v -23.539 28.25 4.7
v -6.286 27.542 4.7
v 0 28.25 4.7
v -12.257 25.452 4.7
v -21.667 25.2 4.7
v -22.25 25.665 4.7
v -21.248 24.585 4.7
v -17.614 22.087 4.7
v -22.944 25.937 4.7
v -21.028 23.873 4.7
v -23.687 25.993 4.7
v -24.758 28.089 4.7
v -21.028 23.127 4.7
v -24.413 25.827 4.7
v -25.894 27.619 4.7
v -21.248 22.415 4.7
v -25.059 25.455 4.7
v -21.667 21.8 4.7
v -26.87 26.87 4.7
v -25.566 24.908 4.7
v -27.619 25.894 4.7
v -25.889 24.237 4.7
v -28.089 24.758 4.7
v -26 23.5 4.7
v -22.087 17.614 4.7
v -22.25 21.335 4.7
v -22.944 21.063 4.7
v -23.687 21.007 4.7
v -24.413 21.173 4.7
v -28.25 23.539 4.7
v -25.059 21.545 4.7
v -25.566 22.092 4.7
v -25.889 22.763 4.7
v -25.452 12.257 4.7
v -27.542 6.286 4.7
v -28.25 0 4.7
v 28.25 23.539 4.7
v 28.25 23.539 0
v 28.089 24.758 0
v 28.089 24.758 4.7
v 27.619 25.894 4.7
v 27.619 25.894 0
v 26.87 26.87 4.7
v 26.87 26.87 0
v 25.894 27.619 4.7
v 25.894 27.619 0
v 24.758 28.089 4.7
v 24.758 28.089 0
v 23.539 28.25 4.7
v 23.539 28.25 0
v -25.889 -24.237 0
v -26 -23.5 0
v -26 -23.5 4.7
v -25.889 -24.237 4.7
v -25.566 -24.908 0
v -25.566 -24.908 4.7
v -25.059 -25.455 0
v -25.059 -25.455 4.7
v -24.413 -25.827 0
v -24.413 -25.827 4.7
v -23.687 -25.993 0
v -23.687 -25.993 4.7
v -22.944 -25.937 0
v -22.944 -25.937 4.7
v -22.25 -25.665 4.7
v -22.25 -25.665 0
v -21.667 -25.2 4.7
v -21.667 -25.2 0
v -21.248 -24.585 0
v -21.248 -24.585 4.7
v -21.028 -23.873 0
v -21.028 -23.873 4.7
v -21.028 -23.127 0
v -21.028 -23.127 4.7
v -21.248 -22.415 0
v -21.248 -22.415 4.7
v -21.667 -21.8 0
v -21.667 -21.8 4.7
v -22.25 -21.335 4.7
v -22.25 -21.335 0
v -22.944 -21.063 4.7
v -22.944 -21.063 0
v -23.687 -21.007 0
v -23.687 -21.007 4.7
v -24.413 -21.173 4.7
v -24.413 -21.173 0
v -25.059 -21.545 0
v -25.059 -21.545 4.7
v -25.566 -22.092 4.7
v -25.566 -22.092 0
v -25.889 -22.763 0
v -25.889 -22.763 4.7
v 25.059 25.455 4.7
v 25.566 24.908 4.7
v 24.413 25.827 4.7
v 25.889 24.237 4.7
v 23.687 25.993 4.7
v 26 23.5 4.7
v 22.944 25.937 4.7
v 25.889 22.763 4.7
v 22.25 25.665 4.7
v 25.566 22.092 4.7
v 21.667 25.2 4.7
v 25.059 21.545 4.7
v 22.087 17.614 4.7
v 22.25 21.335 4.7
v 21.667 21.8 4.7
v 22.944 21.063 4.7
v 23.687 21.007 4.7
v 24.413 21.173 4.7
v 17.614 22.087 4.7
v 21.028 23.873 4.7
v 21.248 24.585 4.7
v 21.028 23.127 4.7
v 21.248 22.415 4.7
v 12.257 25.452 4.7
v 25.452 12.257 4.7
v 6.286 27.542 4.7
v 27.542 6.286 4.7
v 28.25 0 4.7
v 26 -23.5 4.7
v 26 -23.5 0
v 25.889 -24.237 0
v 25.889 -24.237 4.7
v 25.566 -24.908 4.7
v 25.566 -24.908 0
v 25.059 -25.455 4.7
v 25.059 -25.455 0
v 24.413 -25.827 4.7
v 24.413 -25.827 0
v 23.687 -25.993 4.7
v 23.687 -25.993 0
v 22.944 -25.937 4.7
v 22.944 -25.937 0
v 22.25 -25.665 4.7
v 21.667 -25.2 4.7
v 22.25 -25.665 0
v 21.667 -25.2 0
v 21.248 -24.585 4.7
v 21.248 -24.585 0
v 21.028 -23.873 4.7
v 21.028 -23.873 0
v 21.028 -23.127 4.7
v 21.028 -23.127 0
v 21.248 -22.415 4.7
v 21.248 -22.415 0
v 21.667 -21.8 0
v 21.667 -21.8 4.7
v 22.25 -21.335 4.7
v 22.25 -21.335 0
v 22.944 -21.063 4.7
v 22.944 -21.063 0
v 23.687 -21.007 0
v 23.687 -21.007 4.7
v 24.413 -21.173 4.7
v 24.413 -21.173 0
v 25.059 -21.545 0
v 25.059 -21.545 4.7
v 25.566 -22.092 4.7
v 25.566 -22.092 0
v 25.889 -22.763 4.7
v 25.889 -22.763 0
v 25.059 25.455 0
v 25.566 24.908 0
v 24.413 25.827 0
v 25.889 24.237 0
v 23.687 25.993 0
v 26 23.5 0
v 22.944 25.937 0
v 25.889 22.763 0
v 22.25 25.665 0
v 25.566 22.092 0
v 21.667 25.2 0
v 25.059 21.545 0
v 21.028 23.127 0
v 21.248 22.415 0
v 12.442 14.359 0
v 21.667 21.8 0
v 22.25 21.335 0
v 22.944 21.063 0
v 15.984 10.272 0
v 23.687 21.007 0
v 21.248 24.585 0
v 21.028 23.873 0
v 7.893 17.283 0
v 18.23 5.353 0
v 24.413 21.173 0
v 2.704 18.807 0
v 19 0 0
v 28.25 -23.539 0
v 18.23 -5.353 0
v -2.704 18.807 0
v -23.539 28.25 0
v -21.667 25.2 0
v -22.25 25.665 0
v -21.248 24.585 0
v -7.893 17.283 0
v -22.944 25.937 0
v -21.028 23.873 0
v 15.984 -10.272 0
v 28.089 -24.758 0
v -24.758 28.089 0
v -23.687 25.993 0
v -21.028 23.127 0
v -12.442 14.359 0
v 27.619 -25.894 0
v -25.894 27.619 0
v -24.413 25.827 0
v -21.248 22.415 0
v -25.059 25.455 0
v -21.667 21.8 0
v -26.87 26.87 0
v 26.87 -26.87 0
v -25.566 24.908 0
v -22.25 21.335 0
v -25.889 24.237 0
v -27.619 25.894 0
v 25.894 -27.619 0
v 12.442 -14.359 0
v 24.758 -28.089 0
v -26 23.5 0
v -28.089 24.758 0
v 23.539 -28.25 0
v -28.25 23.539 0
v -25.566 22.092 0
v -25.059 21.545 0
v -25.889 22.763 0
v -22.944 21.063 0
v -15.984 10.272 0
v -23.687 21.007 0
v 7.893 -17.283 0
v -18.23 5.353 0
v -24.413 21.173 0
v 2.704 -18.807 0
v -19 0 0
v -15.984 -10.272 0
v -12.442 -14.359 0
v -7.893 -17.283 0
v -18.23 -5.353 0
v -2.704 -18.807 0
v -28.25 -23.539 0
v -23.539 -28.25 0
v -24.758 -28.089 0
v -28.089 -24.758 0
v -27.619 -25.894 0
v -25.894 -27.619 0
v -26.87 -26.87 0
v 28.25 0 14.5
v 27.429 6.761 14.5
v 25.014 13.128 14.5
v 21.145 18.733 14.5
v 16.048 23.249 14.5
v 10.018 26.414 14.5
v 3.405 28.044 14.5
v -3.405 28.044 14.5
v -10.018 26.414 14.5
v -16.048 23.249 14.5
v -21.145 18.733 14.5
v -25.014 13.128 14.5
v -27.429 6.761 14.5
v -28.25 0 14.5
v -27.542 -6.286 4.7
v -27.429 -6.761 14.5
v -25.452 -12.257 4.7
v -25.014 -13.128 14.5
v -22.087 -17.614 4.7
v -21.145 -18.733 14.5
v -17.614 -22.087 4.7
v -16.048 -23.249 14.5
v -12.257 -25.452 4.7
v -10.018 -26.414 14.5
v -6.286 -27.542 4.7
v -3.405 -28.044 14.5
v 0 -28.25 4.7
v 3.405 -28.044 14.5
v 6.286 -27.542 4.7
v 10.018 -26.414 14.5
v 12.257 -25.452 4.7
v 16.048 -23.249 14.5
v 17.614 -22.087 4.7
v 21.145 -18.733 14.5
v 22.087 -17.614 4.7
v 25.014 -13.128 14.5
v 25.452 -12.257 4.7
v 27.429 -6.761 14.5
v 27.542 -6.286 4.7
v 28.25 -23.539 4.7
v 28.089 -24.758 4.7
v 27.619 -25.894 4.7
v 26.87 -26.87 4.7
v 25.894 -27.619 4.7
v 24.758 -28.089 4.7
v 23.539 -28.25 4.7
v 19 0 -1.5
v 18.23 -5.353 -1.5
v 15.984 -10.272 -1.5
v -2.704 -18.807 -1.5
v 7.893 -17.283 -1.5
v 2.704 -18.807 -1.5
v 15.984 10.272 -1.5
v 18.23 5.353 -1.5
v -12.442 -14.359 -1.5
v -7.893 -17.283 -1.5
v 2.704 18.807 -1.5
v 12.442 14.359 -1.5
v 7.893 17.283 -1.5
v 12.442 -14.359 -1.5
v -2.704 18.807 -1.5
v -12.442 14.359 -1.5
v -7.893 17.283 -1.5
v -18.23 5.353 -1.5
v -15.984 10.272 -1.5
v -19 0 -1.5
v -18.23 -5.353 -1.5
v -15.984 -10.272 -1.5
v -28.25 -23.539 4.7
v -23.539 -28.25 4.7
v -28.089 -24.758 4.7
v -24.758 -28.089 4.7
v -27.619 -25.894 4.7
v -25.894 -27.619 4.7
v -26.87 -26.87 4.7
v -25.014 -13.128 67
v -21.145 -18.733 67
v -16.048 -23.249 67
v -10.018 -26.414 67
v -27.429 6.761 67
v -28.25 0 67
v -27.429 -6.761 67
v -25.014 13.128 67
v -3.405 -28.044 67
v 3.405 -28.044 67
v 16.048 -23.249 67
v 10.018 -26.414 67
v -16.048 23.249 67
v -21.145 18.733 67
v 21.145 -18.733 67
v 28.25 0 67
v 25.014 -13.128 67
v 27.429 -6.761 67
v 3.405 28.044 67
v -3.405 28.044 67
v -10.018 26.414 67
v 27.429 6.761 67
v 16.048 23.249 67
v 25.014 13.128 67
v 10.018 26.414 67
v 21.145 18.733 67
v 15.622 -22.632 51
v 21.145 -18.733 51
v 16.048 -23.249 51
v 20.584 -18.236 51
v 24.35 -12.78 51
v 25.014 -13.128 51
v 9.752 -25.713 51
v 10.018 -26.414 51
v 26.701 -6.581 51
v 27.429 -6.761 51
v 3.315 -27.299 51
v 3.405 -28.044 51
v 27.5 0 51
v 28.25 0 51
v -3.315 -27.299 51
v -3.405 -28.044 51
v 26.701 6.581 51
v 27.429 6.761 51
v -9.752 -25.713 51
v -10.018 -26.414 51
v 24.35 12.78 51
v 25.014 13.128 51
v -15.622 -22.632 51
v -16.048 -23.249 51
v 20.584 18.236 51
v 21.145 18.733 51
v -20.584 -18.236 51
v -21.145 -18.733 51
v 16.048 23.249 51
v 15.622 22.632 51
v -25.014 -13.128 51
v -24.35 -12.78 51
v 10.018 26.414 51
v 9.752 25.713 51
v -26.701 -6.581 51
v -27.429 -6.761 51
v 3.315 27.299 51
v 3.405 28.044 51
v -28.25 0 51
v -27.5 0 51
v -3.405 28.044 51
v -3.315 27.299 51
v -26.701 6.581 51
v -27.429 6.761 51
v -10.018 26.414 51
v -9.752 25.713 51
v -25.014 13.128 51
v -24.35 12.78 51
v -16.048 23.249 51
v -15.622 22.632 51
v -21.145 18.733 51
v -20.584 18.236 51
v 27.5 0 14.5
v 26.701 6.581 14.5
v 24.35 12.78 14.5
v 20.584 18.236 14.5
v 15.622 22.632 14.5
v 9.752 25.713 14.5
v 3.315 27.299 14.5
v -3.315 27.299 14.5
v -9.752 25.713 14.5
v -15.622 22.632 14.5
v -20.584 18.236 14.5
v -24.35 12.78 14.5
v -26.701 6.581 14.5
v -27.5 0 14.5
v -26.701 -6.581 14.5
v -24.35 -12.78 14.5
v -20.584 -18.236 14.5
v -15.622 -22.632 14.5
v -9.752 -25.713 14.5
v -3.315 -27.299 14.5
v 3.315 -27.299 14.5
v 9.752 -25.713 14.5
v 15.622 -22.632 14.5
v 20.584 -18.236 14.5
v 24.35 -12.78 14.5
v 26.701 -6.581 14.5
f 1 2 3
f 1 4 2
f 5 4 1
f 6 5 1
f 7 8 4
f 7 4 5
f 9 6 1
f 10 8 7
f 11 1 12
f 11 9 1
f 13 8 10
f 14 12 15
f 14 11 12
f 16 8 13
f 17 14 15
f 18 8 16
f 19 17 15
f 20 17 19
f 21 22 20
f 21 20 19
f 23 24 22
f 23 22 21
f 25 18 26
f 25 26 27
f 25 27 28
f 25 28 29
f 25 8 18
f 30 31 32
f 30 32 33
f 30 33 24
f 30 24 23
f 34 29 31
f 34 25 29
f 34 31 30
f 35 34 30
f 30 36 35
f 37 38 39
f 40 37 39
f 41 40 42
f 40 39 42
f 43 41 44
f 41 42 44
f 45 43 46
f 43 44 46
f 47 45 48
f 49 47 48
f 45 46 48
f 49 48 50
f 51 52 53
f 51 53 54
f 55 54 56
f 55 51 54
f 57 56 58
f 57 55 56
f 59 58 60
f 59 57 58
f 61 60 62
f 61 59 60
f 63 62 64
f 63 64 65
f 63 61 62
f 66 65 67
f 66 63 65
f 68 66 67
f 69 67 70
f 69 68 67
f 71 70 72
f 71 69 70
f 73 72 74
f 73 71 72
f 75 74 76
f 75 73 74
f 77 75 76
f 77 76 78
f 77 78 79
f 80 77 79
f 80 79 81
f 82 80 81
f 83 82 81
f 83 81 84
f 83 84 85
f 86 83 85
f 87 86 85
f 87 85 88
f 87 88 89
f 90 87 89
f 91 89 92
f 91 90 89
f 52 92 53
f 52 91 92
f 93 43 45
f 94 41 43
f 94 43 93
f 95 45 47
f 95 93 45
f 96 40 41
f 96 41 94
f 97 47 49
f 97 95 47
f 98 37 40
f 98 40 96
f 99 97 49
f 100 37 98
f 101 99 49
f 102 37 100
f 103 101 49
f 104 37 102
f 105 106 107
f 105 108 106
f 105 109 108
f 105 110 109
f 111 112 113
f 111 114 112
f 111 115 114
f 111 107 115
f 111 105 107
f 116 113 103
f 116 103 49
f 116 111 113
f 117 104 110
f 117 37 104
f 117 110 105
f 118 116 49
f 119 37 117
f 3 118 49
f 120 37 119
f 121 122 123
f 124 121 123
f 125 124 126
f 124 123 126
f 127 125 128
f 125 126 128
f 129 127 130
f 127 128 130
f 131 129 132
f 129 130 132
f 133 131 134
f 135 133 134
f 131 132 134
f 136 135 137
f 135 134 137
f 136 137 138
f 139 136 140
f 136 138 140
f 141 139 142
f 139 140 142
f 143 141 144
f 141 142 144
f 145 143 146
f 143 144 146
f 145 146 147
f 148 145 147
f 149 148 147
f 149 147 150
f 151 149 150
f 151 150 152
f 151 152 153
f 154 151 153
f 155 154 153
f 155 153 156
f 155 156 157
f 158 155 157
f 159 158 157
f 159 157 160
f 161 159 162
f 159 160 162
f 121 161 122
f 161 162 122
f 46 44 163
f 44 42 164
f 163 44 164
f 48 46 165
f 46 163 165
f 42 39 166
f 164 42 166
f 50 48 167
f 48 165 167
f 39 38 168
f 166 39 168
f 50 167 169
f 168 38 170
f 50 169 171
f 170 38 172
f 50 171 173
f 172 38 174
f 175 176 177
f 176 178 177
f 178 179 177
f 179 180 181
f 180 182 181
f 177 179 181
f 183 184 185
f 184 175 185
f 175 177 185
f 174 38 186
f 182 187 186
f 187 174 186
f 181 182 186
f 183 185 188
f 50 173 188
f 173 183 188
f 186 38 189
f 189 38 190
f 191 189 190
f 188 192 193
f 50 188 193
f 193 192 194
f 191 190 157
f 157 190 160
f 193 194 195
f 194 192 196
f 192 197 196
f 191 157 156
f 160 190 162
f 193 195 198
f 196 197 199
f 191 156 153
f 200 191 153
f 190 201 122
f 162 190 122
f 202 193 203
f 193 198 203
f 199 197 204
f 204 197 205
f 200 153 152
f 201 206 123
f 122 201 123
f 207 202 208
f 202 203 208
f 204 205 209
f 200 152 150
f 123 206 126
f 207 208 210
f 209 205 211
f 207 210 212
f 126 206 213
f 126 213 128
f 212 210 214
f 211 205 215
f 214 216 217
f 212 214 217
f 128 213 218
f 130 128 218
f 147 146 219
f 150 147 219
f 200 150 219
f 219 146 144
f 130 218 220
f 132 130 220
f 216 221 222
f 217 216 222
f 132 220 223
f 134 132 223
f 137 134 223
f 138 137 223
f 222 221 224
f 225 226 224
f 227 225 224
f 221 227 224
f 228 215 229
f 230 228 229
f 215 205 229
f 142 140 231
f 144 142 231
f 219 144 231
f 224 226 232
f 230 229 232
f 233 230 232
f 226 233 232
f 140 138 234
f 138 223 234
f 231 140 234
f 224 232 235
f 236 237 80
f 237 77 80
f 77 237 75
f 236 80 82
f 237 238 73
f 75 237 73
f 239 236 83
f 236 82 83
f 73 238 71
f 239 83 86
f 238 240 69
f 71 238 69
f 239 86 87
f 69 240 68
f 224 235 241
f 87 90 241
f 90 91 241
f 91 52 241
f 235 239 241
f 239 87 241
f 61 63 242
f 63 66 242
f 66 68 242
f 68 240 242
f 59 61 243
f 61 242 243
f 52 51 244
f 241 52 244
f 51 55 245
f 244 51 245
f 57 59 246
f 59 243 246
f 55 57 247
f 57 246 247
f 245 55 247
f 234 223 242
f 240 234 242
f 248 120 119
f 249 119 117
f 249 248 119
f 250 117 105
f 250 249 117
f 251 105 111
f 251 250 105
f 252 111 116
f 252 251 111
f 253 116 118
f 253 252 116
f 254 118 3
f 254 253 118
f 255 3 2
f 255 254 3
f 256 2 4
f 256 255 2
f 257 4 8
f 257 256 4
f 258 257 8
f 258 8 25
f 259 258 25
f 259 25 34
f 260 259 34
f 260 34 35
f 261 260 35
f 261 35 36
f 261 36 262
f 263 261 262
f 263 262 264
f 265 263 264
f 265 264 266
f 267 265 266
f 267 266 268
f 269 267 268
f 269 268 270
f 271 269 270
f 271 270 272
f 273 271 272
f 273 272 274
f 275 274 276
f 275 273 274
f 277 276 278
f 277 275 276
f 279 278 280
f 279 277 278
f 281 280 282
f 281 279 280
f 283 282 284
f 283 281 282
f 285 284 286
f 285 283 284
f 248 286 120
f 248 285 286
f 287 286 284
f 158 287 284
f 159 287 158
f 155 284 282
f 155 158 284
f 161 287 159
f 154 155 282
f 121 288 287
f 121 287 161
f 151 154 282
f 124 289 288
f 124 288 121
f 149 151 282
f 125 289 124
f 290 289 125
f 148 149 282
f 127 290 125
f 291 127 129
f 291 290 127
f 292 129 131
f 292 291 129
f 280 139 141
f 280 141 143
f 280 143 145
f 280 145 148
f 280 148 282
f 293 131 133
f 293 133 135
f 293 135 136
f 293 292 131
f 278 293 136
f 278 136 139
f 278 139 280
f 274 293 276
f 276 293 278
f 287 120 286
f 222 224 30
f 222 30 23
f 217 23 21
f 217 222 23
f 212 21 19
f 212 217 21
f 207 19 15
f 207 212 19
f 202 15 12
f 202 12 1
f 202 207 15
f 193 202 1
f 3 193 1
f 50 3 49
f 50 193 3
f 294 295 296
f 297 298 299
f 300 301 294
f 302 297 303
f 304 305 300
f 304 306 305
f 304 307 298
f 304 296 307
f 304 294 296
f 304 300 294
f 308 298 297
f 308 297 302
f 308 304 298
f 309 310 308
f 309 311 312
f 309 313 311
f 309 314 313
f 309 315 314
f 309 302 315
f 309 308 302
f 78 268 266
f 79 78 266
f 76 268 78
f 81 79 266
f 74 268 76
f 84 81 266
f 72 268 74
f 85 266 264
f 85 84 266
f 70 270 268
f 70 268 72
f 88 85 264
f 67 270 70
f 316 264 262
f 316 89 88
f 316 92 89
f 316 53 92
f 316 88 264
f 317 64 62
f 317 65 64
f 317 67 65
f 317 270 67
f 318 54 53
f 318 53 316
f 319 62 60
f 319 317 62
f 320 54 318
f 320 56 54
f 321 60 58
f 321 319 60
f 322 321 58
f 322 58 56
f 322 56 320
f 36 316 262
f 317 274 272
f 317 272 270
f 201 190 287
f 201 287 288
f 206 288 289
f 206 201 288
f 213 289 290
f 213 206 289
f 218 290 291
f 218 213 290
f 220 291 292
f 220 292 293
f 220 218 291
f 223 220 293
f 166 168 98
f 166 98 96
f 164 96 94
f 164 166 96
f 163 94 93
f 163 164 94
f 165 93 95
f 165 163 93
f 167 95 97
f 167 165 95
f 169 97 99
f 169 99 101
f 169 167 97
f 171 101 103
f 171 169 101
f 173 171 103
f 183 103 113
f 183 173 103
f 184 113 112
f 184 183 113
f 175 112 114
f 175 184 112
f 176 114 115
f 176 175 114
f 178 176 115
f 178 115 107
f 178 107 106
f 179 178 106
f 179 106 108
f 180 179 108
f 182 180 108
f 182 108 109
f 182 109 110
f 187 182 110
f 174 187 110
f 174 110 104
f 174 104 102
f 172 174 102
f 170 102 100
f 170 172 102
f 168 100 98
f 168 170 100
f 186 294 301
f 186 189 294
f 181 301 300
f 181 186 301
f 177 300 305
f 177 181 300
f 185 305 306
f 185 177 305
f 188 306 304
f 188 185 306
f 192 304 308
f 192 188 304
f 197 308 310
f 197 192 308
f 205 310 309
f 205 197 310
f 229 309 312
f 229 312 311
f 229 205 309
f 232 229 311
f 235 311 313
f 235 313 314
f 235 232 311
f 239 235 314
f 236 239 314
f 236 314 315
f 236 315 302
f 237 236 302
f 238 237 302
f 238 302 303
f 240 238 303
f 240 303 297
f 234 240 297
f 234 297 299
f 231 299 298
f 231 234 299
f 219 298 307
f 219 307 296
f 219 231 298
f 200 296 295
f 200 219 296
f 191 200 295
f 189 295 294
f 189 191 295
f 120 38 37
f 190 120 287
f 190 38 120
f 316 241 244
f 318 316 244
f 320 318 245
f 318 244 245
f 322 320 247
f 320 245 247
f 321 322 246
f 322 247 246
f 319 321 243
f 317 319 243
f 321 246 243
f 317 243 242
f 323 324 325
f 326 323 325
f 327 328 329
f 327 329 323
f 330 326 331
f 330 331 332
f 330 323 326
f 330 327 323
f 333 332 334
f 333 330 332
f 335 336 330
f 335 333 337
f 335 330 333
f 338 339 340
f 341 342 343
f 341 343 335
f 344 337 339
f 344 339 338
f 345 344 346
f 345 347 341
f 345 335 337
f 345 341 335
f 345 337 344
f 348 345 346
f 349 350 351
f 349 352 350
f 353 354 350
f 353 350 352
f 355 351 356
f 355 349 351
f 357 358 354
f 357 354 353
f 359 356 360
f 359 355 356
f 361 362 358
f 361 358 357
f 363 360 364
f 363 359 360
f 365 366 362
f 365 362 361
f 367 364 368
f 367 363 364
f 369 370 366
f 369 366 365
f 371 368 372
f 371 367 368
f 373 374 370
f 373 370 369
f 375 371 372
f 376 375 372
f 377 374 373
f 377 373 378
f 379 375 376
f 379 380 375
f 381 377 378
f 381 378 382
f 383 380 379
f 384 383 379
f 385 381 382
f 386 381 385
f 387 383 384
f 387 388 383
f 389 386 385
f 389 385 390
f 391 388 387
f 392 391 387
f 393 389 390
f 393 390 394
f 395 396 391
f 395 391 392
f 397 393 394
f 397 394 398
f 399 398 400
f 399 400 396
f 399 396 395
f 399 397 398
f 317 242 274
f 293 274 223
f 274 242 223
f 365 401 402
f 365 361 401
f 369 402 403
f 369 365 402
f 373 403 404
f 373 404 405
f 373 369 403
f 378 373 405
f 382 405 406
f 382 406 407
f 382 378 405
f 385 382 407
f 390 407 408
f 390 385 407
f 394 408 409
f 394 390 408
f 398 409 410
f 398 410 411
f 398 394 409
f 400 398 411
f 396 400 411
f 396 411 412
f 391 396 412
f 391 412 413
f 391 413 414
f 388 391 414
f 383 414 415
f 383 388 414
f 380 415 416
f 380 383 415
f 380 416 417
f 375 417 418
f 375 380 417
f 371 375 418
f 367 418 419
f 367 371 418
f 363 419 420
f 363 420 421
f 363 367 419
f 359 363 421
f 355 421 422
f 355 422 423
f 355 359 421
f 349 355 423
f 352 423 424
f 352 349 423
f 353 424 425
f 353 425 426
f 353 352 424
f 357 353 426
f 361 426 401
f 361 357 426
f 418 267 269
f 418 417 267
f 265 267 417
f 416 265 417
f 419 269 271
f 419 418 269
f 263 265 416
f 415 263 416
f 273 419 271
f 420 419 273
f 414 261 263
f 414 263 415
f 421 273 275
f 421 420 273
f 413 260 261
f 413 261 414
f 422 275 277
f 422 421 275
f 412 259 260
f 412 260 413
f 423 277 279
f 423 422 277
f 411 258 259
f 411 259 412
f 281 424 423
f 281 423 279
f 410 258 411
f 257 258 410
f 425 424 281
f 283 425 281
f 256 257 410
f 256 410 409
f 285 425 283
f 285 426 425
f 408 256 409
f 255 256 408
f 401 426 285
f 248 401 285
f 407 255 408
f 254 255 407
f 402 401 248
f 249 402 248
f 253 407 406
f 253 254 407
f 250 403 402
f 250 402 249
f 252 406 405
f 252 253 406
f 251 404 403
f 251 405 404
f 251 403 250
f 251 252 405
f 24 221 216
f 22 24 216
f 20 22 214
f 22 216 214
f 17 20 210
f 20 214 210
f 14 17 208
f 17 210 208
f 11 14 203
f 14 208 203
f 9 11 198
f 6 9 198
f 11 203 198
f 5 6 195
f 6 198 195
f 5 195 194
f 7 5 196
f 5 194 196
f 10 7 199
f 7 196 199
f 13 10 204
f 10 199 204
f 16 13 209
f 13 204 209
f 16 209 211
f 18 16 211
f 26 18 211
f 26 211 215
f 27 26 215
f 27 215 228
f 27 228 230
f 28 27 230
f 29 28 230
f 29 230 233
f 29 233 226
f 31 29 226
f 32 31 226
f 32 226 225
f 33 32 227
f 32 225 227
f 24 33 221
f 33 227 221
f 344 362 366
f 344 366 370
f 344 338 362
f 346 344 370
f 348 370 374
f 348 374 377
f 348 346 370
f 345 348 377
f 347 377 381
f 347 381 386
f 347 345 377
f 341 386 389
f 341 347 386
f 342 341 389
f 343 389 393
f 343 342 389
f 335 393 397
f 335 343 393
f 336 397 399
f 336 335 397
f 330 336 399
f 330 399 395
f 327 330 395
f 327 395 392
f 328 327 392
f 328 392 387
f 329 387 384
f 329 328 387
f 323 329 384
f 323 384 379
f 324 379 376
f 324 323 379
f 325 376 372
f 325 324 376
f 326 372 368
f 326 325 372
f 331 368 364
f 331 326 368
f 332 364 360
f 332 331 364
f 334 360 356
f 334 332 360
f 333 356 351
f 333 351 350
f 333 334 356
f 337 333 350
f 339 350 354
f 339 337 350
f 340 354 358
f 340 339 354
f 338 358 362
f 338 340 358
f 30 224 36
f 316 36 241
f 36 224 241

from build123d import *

# Parameters (mm, degrees)
SKETCH_R             = 2.5
PAD_DEPTH            = 4.7
SKETCH_MIRRORED_2_R  = 2.5
PAD_MIRRORED_2_DEPTH = 4.7


with BuildPart() as part:
    # Sketch → Pad (new body)
    with BuildSketch(Plane.XY):
        with BuildLine():
            Line((0, 0), (28.25, 0))
            Line((28.25, 0), (28.25, 23.538582))
            ThreePointArc((28.25, 23.538582), (26.870058, 26.870058), (23.538582, 28.25))
            Line((23.538582, 28.25), (0, 28.25))
            Line((0, 28.25), (0, 0))
        make_face()
        with Locations((23.5, 23.5)):
            Circle(SKETCH_R, mode=Mode.SUBTRACT)
    pad = extrude(amount=PAD_DEPTH)

    # Sketch Mirrored 2 → Pad Mirrored 2 (add)
    with BuildSketch(Plane(origin=(0, 0, 0), x_dir=(-1, 0, 0), z_dir=(0, 0, -1))):
        with BuildLine():
            Line((0, 0), (28.25, 0))
            Line((28.25, 0), (28.25, 23.538582))
            ThreePointArc((28.25, 23.538582), (26.870058, 26.870058), (23.538582, 28.25))
            Line((23.538582, 28.25), (0, 28.25))
            Line((0, 28.25), (0, 0))
        make_face()
        with Locations((23.5, 23.5)):
            Circle(SKETCH_MIRRORED_2_R, mode=Mode.SUBTRACT)
    pad_mirrored_2 = extrude(amount=-PAD_MIRRORED_2_DEPTH)

    # Mirrored001: Pad, Pad Mirrored 2 across Sketch H_Axis
    add(pad.mirror(Plane.ZX))
    add(pad_mirrored_2.mirror(Plane.ZX))

    # Sketch001 → Revolution (revolve)
    with BuildSketch(Plane.XZ):
        Polygon((19, 0), (28.25, 0), (28.25, 14.5), (27.5, 14.5), (27.5, 51), (28.25, 51), (28.25, 67), (0, 67), (0, -1.5), (19, -1.5), align=None)
    revolve(axis=Axis((0, 0, 0), (0, 0, 1)))


solid = part.part
